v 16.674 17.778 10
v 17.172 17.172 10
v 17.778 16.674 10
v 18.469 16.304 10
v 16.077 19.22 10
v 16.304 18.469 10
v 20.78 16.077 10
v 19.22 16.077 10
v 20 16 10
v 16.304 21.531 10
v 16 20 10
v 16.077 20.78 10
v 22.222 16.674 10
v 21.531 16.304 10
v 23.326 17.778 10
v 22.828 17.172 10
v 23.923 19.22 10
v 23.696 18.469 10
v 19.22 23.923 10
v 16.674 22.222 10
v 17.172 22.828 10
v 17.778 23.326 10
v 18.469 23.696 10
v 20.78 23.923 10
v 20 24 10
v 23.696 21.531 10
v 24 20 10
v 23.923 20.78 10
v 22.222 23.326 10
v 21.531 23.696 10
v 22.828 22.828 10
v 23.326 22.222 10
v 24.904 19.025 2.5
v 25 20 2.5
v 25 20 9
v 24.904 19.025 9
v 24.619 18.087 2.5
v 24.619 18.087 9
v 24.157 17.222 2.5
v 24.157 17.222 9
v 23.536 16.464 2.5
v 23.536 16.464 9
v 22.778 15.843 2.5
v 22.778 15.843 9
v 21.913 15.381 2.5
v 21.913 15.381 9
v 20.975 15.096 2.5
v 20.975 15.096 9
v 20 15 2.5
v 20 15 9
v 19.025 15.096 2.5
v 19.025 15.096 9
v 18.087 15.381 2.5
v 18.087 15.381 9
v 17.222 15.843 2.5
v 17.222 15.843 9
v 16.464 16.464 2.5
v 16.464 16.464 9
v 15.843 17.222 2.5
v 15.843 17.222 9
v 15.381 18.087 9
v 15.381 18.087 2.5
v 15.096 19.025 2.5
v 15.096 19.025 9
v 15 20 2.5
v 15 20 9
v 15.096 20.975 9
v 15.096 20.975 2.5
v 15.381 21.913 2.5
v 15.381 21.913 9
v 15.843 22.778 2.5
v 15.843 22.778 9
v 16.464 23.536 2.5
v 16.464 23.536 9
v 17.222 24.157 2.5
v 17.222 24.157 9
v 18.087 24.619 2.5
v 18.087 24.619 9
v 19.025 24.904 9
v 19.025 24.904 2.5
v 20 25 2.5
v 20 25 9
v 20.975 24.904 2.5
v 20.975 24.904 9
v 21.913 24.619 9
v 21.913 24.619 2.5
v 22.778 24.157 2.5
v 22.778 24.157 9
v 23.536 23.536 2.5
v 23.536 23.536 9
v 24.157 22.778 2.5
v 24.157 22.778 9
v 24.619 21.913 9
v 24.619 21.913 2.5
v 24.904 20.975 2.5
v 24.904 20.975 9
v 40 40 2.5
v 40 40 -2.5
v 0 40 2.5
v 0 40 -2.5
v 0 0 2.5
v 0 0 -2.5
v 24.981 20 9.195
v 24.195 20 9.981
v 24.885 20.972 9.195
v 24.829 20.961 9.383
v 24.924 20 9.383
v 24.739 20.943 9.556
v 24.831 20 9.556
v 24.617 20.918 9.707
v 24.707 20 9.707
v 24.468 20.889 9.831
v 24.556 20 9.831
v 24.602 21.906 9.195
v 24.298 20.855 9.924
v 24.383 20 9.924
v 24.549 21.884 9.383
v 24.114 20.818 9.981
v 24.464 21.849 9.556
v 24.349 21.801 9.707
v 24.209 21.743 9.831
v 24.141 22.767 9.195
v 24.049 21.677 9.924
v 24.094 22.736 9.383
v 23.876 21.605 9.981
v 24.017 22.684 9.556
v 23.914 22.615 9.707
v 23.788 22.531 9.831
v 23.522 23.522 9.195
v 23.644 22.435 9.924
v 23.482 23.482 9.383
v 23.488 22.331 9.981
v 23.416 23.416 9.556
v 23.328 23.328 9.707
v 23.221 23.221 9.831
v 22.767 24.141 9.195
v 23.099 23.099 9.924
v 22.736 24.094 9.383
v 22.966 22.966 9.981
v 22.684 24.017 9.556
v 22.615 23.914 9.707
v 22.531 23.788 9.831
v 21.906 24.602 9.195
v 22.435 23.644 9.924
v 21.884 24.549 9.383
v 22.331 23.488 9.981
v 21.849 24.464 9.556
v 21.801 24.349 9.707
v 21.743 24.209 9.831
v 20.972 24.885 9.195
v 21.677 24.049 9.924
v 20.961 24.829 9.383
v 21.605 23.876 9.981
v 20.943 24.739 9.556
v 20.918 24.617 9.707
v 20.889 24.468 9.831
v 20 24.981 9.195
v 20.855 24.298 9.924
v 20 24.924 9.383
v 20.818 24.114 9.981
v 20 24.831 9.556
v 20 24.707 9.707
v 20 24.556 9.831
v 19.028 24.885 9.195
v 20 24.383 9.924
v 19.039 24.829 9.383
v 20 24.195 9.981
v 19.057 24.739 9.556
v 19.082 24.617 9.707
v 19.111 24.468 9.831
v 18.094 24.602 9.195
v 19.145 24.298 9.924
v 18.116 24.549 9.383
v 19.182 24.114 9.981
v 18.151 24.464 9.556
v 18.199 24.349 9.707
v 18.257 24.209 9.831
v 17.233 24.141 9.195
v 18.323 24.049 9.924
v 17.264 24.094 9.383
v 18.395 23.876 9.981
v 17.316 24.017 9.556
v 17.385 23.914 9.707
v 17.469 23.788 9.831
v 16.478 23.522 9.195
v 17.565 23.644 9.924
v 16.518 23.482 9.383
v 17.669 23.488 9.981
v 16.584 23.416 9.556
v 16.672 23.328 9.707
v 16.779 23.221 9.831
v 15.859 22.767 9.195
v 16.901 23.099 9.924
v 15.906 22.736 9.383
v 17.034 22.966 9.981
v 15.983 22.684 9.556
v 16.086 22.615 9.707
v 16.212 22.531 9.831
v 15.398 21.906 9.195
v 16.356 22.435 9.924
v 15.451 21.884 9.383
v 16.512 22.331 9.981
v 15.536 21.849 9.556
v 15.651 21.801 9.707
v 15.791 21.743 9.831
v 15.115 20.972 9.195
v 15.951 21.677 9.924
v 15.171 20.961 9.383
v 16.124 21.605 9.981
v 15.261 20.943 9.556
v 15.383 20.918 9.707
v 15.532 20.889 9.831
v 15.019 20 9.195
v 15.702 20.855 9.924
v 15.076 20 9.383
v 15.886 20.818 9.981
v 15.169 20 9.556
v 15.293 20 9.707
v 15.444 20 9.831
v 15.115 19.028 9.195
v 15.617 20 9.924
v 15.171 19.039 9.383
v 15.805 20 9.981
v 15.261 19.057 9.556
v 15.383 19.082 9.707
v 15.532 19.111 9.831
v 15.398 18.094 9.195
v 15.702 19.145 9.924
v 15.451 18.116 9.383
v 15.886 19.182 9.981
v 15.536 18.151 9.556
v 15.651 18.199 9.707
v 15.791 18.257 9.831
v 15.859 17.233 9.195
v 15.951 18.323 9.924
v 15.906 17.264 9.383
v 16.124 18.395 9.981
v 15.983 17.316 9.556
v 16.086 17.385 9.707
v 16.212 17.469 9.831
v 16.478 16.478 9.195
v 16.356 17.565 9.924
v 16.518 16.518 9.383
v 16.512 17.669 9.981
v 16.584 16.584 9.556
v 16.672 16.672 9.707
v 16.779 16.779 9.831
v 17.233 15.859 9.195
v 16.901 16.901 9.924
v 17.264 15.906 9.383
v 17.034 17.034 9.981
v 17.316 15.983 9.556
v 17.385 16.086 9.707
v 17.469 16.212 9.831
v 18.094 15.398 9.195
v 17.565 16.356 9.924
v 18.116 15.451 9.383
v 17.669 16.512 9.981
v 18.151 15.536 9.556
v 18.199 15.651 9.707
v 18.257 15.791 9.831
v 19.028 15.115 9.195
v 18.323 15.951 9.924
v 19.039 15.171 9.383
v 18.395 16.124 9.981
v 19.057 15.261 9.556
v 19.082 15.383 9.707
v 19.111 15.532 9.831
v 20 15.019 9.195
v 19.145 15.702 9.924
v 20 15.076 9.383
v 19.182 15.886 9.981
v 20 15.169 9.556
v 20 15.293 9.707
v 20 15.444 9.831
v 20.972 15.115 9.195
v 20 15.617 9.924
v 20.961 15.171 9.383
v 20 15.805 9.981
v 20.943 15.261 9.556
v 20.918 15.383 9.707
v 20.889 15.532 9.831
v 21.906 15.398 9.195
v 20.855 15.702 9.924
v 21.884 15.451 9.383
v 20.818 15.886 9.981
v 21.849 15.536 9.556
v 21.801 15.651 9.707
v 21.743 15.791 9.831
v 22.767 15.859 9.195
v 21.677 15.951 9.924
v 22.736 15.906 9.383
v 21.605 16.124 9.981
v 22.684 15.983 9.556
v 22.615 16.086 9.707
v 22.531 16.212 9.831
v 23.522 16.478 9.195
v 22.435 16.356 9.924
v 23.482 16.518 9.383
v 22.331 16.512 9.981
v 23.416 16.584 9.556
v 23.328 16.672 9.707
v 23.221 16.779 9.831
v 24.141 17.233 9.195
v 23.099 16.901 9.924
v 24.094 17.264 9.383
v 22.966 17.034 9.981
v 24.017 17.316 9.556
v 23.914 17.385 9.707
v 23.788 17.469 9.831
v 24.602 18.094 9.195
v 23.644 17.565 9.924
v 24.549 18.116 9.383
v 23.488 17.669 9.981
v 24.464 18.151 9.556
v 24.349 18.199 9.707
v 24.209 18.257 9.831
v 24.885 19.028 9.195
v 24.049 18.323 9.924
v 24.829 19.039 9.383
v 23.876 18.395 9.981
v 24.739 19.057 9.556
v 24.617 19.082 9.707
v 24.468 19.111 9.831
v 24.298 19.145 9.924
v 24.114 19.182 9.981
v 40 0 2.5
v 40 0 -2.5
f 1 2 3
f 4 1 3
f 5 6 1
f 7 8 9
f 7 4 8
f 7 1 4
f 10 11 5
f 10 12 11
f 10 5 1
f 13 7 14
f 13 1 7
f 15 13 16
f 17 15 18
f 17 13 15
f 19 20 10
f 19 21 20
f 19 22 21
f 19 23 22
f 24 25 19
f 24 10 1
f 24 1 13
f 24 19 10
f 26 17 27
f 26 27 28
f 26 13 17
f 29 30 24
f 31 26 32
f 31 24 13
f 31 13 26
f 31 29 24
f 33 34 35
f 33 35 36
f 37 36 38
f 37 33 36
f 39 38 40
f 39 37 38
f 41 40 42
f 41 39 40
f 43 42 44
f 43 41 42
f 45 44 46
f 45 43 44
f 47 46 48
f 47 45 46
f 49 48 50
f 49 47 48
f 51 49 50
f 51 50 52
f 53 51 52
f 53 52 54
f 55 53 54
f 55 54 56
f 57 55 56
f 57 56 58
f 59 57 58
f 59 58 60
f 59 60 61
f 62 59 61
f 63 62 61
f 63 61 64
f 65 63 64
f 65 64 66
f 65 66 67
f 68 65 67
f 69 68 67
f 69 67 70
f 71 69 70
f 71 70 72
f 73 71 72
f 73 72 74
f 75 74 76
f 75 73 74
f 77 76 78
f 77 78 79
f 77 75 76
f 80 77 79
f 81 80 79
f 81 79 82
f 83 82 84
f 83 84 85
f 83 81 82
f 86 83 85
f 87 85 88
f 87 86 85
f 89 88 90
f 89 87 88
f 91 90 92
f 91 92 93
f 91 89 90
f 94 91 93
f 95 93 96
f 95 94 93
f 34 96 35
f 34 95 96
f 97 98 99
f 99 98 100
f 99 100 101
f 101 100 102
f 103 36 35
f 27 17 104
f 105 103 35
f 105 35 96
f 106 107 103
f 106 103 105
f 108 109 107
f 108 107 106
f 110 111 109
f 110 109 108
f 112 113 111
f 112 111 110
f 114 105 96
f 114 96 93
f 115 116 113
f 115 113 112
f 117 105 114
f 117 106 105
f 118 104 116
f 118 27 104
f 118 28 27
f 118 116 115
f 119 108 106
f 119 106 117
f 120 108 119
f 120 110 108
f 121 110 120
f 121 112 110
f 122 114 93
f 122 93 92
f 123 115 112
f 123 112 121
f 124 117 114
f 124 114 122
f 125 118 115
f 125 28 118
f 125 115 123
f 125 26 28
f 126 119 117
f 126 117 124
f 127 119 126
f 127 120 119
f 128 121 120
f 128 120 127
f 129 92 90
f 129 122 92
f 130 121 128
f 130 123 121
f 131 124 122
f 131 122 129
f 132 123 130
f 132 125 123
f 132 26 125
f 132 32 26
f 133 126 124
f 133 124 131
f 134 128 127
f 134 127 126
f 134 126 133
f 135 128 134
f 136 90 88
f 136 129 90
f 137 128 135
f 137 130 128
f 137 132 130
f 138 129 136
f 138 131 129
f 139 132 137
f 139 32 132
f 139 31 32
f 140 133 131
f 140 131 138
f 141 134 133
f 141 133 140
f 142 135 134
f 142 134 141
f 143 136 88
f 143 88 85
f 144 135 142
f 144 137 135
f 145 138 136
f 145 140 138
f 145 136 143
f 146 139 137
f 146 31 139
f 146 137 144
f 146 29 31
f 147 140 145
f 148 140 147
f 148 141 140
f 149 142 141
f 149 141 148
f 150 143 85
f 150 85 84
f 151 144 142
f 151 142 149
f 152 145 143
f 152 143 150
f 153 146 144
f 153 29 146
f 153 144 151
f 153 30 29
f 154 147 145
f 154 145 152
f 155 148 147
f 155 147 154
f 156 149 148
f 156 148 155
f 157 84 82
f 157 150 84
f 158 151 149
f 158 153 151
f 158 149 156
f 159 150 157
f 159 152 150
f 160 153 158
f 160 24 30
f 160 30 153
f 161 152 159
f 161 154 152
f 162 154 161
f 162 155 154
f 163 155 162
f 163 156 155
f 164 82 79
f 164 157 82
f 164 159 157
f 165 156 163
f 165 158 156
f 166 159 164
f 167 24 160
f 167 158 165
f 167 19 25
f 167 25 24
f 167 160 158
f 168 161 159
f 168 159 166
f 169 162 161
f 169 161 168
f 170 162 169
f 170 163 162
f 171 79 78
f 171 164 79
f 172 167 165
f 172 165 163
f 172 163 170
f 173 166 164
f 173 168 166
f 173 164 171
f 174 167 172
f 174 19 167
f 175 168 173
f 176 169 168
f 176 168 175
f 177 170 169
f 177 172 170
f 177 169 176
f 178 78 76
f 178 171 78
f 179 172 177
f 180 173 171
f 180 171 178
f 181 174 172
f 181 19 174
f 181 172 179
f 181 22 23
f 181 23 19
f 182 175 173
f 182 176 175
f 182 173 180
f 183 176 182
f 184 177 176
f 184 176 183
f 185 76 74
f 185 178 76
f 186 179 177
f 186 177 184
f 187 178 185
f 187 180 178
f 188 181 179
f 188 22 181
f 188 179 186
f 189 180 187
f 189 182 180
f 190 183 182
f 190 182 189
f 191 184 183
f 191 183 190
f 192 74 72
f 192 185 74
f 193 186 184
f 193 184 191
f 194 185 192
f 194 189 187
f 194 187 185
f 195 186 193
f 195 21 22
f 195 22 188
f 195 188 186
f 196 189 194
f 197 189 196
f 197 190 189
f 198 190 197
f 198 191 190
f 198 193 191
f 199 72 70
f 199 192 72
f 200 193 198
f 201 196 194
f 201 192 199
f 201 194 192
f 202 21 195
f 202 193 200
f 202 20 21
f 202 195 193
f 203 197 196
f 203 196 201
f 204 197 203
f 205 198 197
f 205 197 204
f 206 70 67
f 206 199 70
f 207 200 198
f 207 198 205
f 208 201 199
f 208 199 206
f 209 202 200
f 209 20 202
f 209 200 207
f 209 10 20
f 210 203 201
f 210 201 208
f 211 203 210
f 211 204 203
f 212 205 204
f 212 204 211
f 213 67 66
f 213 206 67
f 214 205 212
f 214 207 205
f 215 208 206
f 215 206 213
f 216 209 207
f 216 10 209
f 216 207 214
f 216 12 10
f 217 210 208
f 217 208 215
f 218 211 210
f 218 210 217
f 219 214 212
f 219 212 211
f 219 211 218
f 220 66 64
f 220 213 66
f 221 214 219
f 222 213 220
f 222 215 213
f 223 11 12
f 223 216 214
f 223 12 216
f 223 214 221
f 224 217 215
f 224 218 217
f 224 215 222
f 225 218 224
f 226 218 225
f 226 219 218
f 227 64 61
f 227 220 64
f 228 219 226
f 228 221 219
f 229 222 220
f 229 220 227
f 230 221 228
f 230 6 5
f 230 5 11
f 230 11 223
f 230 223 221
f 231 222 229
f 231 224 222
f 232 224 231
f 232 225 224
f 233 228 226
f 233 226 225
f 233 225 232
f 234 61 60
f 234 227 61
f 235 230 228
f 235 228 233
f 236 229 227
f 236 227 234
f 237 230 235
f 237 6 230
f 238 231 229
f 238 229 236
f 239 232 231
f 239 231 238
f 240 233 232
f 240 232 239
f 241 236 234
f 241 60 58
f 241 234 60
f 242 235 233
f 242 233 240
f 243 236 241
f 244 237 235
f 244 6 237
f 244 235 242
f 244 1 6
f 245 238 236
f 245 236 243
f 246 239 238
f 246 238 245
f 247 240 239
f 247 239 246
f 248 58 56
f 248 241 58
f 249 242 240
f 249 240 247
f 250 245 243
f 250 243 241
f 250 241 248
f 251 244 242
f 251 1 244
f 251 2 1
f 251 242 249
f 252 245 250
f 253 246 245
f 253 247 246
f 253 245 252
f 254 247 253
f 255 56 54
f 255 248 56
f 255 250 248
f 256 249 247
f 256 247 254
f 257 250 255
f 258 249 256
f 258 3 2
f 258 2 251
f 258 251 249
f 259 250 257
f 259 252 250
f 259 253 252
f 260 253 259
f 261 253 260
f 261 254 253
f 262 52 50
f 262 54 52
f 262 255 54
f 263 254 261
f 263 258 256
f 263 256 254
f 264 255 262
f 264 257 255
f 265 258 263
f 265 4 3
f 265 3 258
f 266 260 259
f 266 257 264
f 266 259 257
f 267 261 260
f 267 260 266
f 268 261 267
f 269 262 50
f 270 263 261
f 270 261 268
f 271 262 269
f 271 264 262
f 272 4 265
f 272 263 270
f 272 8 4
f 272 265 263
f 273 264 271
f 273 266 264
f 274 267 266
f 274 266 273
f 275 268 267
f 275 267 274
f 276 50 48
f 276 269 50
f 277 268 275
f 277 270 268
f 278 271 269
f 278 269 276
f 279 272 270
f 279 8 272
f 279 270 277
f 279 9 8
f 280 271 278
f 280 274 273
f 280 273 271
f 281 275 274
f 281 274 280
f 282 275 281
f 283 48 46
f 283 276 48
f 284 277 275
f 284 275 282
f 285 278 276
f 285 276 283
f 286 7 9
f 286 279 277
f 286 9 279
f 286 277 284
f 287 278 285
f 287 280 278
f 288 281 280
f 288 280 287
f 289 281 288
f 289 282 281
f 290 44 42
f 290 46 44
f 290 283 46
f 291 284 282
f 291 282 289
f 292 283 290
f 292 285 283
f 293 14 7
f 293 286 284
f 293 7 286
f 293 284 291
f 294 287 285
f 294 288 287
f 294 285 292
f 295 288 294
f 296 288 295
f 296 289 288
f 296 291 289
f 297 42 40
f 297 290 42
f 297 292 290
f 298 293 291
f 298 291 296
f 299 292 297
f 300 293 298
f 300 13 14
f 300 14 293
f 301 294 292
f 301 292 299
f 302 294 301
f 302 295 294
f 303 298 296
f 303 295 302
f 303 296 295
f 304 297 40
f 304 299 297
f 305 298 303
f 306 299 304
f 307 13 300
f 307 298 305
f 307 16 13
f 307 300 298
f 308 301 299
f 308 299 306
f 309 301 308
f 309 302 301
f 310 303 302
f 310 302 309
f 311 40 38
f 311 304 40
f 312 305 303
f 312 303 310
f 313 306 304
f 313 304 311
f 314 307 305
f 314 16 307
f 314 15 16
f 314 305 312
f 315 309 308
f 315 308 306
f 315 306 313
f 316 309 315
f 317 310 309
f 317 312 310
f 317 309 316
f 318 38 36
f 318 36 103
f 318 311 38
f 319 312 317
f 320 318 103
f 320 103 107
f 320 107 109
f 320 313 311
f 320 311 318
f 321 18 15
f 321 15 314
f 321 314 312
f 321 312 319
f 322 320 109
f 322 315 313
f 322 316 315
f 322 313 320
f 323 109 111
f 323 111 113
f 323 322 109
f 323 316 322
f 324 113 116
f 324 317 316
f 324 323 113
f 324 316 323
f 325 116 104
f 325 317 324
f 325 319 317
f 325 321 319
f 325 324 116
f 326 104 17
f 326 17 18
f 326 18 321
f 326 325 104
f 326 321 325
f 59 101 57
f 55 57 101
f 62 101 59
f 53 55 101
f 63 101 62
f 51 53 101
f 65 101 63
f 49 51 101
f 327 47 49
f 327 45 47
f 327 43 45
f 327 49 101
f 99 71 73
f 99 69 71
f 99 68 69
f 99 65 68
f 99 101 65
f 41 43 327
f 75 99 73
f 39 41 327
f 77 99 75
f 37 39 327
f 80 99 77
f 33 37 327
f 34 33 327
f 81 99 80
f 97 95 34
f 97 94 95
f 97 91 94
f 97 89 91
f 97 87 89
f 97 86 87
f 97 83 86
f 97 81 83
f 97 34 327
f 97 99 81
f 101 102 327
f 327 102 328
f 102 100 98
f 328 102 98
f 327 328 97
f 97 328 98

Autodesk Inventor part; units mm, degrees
ref_plane "YZ Plane" through (0, 0, 0) normal (1, 0, 0) x (0, 1, 0)
ref_plane "XZ Plane" through (0, 0, 0) normal (0, 1, 0) x (-1, 0, 0)
ref_plane "XY Plane" through (0, 0, 0) normal (0, 0, 1) x (1, 0, 0)
sketch "Esboço1" plane through (0, 0, 0) normal (0, 0, 1) x (1, 0, 0)
  line L0 (0, 0) -> (40, 0)
  line L1 (40, 0) -> (40, 40)
  line L2 (40, 40) -> (0, 40)
  line L3 (0, 40) -> (0, 0)
  dimension "d0" = 40
  dimension "d1" = 40
extrude "Extrusão1" add sketch "Esboço1" along normal mid plane 5
sketch "Esboço2" plane through (0, 0, 2.5) normal (0, 0, 1) x (1, 0, 0)
  line L0 (0, 40) -> (0, 0) projected
  line L1 (0, 20) -> (40, 20)
  line L2 (40, 0) -> (40, 40) projected
  circle A0 centre (20, 20) radius 5
  dimension "d6" = 10
extrude "Extrusão2" add sketch "Esboço2" along normal blind 7.5
fillet "Arredondamento1" radius 1 1 edges at (15, 20, 10)
properties part number "base"
